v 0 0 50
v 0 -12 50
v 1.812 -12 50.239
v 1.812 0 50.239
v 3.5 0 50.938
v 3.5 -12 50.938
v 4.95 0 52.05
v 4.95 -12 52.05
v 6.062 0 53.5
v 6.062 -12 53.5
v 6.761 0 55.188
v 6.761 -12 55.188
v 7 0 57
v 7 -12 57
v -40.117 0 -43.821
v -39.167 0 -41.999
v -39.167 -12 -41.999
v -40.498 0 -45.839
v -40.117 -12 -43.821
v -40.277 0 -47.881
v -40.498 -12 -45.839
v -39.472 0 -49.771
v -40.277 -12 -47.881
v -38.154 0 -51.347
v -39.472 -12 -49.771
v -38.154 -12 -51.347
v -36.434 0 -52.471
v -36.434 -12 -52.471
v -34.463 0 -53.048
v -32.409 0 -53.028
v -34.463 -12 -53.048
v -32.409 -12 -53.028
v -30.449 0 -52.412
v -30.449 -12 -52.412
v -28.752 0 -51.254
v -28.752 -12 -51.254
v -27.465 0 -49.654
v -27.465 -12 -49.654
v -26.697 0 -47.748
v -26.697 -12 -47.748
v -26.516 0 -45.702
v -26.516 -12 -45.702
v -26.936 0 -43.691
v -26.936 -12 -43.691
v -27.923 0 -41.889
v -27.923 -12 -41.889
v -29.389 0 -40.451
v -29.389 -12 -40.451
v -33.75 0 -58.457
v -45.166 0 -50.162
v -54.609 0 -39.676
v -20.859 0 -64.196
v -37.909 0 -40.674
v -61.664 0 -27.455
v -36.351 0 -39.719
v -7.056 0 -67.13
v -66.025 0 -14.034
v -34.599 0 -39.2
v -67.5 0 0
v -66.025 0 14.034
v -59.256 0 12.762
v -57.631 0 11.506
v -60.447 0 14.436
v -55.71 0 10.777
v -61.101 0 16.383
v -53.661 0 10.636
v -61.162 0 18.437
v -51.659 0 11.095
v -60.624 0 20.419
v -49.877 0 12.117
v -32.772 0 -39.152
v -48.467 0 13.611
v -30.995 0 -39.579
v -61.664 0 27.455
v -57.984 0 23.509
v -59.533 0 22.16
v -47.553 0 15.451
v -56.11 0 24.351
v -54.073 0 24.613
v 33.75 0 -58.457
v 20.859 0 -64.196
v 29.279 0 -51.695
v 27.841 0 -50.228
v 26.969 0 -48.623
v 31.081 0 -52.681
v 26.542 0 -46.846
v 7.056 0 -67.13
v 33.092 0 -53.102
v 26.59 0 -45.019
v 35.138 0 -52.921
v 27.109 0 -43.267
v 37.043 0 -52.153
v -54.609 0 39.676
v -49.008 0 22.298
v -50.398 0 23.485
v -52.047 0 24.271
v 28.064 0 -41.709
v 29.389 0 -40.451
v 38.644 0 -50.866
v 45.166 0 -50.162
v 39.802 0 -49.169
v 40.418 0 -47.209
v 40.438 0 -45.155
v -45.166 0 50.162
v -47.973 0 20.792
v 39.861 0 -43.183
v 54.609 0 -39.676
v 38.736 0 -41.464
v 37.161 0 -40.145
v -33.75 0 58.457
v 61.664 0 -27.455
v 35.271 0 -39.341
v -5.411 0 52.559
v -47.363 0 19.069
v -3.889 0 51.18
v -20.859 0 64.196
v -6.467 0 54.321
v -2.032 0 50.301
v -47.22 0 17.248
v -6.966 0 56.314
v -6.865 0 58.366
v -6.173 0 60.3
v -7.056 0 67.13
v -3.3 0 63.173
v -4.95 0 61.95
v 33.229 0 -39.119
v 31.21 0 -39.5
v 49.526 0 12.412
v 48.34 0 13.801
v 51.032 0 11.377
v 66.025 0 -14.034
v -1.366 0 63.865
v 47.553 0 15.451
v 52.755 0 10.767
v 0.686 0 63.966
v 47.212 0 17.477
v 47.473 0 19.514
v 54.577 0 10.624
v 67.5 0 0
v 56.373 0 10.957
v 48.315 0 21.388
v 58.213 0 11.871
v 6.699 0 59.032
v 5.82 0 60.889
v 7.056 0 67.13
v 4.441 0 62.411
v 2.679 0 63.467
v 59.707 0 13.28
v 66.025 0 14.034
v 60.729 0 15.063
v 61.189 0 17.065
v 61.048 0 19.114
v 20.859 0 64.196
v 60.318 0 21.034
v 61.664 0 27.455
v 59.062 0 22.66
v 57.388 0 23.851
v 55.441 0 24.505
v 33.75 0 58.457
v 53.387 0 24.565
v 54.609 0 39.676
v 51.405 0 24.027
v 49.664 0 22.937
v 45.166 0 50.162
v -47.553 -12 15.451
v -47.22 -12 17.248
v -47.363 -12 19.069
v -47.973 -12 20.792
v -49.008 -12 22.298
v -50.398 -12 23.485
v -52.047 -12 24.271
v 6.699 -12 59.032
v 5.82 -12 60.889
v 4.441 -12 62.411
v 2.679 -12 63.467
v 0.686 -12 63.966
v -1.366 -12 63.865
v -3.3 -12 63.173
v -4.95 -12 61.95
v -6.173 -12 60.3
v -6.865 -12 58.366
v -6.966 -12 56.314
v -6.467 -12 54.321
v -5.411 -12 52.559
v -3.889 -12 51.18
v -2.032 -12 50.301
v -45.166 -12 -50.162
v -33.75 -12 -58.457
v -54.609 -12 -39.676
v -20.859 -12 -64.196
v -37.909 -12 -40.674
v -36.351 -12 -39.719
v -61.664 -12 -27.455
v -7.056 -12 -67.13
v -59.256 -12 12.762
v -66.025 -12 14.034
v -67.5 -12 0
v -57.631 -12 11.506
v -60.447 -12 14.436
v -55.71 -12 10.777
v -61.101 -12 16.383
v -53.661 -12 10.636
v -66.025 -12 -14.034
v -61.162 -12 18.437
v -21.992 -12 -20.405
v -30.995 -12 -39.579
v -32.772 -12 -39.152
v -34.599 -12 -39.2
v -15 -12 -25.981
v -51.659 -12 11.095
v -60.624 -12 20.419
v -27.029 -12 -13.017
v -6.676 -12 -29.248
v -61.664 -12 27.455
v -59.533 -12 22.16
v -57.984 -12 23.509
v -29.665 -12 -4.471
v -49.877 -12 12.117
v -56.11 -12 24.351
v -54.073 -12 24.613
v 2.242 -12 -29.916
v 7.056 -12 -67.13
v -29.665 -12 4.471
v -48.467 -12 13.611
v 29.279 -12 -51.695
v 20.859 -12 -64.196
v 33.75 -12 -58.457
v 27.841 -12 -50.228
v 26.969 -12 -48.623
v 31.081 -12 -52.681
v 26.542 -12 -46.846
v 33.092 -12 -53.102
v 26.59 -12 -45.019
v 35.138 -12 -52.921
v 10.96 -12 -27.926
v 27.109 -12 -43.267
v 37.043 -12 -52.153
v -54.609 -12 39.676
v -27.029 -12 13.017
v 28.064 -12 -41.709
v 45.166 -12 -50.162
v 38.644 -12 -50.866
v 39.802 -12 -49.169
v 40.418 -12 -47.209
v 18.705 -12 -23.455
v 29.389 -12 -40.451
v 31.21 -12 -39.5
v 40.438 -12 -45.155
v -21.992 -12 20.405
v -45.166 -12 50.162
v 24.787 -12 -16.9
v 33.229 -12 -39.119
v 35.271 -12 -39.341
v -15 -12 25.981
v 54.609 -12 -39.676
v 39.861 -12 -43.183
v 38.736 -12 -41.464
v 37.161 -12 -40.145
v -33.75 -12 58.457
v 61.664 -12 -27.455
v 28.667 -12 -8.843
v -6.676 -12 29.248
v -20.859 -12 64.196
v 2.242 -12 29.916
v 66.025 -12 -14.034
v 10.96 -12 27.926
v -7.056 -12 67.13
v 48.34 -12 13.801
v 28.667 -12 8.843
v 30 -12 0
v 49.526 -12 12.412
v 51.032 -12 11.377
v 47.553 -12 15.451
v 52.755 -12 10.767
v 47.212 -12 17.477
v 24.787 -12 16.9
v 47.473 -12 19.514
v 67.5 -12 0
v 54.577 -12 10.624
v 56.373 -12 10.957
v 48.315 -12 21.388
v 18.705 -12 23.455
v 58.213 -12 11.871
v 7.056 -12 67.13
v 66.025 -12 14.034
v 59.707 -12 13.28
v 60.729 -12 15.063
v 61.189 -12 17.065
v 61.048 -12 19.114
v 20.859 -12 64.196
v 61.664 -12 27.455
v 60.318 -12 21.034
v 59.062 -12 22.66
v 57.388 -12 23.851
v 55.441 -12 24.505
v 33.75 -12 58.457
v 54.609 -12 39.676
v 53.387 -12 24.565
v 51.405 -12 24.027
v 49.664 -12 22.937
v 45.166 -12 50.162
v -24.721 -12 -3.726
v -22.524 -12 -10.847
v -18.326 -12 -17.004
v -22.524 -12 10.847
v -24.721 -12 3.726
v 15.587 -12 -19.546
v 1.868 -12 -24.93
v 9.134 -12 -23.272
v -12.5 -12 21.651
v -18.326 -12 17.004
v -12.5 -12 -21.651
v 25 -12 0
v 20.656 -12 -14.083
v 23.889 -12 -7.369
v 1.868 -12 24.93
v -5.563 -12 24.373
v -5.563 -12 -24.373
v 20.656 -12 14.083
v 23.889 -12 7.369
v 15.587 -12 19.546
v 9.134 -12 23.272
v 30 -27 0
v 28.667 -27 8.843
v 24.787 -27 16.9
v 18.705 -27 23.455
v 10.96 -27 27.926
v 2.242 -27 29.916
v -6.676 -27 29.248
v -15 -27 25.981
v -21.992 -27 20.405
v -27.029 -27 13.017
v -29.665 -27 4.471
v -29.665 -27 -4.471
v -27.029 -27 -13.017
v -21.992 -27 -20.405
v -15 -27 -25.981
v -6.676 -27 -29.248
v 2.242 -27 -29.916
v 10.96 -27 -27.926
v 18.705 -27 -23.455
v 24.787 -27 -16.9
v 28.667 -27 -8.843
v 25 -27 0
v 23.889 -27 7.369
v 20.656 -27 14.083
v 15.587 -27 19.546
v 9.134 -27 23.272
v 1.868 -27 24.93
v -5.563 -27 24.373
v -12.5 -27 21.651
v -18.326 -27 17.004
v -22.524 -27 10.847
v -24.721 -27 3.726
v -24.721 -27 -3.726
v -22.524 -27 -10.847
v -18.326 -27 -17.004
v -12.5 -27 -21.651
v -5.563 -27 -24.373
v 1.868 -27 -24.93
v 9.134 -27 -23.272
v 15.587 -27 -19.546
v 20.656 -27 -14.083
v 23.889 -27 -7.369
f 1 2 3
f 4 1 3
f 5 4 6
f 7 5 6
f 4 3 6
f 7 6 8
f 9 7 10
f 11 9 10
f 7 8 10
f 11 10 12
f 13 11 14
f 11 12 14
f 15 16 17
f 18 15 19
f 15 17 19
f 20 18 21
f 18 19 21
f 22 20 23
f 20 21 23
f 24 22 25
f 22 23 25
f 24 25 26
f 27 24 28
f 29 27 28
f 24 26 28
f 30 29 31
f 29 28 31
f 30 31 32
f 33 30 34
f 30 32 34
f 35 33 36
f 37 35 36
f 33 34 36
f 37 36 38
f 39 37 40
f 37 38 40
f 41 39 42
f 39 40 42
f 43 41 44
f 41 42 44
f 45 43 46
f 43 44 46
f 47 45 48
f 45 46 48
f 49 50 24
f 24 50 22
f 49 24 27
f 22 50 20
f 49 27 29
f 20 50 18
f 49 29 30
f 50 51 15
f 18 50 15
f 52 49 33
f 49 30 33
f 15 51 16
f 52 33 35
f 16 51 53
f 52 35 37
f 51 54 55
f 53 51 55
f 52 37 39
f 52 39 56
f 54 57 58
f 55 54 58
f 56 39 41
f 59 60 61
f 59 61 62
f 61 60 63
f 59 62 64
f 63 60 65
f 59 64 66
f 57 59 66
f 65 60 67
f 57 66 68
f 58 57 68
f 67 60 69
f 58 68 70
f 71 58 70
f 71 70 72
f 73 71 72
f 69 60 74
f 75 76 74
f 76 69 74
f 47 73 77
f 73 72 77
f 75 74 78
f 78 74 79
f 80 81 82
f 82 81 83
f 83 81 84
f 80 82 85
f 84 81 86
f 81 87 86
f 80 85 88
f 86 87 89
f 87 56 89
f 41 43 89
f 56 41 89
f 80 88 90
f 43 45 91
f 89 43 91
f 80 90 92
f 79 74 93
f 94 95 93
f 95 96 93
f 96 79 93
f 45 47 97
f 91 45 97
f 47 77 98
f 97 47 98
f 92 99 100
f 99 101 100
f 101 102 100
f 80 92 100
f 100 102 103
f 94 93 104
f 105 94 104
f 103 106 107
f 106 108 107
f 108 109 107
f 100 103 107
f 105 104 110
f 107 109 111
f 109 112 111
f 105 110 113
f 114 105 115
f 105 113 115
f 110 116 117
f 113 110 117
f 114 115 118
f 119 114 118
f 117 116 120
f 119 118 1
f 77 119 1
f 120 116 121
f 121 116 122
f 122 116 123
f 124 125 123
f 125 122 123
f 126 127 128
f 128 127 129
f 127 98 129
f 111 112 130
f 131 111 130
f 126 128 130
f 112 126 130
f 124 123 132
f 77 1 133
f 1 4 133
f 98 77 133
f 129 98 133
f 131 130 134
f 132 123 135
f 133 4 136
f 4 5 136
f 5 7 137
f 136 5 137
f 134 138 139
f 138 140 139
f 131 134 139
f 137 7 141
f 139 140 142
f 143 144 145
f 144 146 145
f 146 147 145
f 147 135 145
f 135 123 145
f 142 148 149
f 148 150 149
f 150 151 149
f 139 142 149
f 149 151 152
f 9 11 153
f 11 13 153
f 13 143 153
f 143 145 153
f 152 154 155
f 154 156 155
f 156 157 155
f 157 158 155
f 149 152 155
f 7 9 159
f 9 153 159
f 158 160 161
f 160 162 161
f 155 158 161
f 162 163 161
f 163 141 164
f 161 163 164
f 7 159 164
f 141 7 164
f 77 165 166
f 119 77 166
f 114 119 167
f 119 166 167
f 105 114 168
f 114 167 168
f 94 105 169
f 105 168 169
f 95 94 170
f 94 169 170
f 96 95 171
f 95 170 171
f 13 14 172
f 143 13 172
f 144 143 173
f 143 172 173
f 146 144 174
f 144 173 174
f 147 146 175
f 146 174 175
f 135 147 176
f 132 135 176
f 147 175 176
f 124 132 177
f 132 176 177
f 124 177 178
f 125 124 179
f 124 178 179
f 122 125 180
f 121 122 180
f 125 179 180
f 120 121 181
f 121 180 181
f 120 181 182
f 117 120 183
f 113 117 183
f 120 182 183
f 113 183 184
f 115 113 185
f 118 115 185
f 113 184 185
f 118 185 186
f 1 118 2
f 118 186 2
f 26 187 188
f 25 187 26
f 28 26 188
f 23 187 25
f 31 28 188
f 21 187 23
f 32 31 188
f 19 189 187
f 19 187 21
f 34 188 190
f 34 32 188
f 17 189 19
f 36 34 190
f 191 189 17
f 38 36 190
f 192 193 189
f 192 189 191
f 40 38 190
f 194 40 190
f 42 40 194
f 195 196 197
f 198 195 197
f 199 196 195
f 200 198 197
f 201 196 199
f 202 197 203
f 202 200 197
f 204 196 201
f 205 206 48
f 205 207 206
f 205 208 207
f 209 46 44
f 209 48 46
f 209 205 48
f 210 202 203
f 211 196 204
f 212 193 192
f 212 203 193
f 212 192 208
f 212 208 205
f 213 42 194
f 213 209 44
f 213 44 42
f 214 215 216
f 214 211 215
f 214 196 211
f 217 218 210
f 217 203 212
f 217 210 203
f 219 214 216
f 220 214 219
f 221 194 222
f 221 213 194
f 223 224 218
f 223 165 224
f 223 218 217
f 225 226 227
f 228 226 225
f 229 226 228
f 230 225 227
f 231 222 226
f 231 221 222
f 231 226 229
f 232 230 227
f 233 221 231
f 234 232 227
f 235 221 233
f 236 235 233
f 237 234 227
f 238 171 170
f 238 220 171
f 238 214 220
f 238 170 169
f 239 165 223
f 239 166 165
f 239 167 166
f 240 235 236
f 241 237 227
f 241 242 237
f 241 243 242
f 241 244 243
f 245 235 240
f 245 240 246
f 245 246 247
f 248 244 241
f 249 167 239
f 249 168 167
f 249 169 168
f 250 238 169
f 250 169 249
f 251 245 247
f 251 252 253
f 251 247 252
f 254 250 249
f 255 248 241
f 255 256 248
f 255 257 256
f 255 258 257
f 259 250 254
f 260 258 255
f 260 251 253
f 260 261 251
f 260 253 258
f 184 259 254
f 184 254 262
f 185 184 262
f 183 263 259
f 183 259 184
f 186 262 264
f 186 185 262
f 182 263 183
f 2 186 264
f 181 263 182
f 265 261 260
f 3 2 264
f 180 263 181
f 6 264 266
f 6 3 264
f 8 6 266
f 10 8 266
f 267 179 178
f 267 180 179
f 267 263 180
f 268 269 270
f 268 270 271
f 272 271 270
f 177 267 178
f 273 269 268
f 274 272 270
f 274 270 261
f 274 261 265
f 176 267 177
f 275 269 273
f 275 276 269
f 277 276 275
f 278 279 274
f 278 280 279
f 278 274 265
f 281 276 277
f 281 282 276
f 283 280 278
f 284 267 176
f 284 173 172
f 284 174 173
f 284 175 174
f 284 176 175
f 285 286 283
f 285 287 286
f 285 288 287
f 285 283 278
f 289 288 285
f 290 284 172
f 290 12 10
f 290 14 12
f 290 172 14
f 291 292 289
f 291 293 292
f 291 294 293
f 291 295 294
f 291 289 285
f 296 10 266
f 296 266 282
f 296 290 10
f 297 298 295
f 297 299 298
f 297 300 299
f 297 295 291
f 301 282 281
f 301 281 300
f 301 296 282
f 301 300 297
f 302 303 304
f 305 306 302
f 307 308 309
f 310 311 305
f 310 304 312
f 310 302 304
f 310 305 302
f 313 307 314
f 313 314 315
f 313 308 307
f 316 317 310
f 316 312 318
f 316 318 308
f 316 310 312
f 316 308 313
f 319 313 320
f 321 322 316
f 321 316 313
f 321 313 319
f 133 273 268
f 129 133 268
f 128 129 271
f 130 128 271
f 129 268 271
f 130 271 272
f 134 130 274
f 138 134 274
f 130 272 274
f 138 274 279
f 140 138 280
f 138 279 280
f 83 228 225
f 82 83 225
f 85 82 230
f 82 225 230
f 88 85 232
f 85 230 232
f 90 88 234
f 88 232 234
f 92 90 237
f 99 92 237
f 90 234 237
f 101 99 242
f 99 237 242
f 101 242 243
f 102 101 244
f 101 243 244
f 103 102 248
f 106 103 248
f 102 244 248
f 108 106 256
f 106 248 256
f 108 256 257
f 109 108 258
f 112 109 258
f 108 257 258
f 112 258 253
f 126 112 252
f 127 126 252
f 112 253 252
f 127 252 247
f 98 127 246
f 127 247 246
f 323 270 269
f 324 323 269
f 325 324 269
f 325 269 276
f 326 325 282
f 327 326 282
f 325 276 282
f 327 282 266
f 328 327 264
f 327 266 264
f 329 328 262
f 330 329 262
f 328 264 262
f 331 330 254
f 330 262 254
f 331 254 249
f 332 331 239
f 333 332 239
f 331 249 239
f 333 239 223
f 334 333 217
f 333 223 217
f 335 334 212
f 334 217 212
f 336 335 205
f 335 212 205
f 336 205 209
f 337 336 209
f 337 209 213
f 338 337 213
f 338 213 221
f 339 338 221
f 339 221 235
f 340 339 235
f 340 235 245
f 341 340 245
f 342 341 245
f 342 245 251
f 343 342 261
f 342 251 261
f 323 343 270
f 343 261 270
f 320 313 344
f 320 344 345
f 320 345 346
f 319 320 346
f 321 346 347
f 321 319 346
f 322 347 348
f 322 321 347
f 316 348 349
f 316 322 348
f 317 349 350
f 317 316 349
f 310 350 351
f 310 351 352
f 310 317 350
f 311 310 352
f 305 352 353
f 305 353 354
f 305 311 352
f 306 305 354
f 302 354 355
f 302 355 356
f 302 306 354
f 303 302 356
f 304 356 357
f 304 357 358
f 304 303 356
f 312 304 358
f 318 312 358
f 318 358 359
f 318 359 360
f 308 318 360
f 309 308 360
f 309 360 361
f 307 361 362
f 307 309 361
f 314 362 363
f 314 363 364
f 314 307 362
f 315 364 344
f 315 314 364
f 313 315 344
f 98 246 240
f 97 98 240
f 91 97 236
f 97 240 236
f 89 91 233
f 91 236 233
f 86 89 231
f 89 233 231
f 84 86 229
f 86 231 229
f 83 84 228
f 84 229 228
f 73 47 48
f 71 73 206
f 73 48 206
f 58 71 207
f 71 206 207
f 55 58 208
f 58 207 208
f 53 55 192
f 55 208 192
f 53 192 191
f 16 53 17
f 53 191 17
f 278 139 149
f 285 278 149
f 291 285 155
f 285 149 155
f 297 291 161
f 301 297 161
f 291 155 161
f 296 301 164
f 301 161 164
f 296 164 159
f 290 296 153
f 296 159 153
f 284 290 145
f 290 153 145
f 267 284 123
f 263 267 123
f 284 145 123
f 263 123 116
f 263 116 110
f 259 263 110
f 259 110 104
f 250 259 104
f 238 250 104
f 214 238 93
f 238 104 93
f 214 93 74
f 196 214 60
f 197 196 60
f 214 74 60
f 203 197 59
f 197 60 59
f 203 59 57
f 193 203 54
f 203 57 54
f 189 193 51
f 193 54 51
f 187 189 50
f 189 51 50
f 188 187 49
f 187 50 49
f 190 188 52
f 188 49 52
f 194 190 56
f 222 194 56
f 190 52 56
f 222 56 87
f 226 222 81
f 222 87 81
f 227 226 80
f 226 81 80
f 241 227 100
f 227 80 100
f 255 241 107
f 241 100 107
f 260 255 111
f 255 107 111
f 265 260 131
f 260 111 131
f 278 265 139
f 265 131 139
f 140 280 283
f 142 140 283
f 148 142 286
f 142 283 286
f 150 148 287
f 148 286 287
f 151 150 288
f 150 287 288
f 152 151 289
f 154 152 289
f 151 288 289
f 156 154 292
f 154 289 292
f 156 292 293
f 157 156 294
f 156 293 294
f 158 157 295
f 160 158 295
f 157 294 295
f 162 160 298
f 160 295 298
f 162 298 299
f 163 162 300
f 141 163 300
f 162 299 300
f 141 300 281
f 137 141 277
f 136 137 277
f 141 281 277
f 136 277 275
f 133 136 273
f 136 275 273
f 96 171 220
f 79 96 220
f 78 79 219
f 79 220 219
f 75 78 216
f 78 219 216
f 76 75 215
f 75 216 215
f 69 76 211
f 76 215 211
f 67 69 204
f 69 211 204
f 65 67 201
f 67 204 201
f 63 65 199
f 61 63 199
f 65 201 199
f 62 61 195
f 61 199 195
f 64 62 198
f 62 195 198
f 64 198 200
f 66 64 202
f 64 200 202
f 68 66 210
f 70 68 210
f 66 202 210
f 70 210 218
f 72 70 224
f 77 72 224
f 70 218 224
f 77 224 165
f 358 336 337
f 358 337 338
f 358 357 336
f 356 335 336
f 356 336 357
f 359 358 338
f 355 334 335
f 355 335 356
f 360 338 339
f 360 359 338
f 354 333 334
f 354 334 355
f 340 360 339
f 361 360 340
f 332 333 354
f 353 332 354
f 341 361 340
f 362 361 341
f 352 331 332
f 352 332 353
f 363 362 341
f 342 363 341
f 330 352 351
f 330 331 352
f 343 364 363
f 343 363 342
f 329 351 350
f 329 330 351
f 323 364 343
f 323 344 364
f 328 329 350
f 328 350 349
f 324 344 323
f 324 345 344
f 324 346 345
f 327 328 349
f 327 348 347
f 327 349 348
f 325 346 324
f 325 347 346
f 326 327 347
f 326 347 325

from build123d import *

# Parameters (mm, degrees)
F0_R     = 67.5
F1_DEPTH = 12
F2_R     = 30
F2_R_2   = 25
F3_DEPTH = 15
F5_DEPTH = 15
F6_COUNT = 5


with BuildPart() as f1:
    # F0 (on Front) → F1 (new body)
    with BuildSketch(Plane.XZ):
        Circle(F0_R)
    extrude(amount=F1_DEPTH)

    # F2 (on face) → F3 (join)
    with BuildSketch(Plane.XZ.offset(12)):
        Circle(F2_R)
        Circle(F2_R_2, mode=Mode.SUBTRACT)
    extrude(amount=F3_DEPTH)

    # F4 (on face) → F5 (cut)
    with BuildSketch(Plane.XZ.offset(12)):
        with BuildLine():
            ThreePointArc((0, 50), (4.9497474683, 52.0502525317), (7, 57))
            ThreePointArc((7, 57), (-4.9497474683, 61.9497474683), (0, 50))
        make_face()
    f5 = extrude(amount=-F5_DEPTH, mode=Mode.SUBTRACT)

    # F6: F5 ×5 about axis
    f6_axis = Axis((0, -12, 0), (0, -1, 0))
    for i in range(1, F6_COUNT):
        add(f5.rotate(f6_axis, i * 360 / F6_COUNT), mode=Mode.SUBTRACT)


solid = f1.part
